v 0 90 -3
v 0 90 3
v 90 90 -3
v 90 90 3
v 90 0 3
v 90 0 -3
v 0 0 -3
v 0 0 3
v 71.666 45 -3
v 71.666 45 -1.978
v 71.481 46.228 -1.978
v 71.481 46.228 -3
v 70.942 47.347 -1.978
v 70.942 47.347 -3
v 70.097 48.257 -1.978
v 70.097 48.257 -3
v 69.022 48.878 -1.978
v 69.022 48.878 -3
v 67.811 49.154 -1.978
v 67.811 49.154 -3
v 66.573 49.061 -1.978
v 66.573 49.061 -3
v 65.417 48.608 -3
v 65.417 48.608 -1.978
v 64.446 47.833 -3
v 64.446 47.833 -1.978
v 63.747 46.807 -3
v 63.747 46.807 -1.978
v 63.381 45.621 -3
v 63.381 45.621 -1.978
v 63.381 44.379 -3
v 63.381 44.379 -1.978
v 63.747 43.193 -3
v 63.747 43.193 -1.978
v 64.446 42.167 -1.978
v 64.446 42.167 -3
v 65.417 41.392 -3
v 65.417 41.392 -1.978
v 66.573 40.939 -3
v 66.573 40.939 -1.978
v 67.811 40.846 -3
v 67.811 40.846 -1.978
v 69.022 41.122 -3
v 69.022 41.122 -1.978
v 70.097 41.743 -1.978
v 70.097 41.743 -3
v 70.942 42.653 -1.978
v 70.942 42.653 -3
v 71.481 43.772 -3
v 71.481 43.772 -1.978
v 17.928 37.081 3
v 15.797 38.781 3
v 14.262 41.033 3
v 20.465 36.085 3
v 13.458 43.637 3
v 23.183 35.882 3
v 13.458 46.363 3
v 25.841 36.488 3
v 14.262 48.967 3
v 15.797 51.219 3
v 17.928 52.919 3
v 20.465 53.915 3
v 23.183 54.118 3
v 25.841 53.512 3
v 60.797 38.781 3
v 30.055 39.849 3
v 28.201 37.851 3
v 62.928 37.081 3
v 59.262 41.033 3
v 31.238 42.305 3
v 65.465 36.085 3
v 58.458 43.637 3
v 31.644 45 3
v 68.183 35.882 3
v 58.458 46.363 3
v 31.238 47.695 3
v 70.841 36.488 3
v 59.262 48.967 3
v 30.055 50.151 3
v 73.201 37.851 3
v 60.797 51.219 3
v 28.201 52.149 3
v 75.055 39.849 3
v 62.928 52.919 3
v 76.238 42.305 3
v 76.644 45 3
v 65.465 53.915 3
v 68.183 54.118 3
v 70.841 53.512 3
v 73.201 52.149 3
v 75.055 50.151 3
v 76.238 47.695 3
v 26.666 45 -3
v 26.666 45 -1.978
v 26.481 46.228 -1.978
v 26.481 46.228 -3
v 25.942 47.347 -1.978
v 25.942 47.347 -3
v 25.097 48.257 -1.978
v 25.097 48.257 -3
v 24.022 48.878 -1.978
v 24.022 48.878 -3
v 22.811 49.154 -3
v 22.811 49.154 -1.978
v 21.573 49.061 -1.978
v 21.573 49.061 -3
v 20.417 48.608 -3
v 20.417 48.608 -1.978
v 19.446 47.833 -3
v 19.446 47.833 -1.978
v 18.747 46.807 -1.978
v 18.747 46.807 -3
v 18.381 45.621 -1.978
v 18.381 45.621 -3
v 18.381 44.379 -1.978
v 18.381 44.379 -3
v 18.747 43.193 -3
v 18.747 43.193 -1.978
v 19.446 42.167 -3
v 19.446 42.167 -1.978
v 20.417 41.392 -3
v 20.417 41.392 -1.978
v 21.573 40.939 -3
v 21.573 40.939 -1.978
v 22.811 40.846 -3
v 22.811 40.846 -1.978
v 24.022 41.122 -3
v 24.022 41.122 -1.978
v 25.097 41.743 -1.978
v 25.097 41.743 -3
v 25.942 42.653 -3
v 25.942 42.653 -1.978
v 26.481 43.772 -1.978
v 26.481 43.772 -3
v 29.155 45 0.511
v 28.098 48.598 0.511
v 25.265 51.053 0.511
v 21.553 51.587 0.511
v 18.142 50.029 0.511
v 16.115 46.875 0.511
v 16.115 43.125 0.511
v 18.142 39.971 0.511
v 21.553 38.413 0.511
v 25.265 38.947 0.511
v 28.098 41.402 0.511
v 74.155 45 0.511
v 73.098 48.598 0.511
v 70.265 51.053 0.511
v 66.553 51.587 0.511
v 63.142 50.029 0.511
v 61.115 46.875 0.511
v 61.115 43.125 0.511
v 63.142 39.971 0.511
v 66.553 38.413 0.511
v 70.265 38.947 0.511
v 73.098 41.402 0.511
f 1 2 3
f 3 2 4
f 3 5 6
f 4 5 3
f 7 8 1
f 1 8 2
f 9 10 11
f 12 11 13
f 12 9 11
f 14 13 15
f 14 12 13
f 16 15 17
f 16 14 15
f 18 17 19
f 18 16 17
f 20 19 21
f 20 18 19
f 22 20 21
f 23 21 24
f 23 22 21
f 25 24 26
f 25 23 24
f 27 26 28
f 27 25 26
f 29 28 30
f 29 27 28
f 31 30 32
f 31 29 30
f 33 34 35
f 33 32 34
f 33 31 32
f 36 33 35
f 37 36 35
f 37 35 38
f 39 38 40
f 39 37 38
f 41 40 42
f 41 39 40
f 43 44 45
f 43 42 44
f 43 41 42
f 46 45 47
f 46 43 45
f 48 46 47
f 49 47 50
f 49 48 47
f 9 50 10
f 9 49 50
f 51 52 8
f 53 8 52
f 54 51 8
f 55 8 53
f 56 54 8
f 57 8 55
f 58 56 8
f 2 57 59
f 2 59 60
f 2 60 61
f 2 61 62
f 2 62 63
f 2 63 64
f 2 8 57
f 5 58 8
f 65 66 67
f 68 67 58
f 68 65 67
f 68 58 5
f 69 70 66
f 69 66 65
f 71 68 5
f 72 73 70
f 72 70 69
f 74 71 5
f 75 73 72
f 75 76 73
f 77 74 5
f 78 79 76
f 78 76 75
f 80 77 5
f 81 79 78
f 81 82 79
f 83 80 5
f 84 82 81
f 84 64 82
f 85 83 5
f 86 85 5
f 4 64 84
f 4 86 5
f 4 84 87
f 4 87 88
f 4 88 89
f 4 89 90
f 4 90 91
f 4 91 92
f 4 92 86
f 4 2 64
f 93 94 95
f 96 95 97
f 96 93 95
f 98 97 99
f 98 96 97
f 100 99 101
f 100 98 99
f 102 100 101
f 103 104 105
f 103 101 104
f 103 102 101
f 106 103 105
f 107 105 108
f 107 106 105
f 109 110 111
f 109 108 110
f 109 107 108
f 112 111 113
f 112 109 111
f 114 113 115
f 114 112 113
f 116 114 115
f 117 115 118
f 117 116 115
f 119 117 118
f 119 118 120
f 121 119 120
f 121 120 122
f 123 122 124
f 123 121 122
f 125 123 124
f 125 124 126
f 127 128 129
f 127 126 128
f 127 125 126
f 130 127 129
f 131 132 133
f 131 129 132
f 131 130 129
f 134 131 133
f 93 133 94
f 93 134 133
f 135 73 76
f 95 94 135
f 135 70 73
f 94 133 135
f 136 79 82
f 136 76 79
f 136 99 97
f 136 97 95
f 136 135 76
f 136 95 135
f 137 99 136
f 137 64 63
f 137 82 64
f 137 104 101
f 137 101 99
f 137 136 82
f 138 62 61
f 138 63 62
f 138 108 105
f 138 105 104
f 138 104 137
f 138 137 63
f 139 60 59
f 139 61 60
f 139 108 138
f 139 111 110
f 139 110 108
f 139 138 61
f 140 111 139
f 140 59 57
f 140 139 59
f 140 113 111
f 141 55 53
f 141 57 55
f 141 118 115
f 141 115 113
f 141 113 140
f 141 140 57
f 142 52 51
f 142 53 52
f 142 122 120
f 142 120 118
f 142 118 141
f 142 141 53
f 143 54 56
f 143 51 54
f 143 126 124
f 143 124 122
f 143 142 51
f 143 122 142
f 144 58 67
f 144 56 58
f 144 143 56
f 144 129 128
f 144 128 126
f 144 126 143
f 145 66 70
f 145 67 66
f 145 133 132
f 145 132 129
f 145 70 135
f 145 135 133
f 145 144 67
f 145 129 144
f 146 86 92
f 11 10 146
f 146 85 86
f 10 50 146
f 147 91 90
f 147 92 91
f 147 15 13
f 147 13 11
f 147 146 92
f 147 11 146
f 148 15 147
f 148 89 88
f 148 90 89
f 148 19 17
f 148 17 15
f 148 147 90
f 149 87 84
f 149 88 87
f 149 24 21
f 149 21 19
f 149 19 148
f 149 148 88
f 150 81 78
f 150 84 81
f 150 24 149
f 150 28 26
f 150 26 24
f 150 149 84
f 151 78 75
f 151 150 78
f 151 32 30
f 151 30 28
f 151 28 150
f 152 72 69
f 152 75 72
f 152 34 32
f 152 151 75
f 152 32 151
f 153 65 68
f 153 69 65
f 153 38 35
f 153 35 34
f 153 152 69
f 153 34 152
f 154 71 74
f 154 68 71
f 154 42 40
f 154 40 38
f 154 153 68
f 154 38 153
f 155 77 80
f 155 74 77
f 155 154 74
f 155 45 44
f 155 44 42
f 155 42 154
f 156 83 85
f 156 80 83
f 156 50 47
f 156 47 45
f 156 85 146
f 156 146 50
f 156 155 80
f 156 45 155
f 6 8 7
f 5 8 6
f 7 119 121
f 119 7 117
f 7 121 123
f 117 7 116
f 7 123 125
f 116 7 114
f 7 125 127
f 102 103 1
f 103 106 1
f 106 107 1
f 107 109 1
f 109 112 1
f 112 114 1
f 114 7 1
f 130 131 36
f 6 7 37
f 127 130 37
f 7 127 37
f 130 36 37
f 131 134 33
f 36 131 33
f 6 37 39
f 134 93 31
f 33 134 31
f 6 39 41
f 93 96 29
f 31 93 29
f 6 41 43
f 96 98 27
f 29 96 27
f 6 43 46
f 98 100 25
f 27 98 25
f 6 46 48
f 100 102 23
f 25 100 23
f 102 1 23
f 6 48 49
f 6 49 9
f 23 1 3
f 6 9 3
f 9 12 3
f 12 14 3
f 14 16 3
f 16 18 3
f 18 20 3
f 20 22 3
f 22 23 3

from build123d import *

# Parameters (mm, degrees)
SKETCH1_W           = 90
SKETCH1_H           = 90
SKETCH1_R           = 4.1656
BOSS_EXTRUDE1_DEPTH = 3
SKETCH2_R           = 9.144
CUT_EXTRUDE1_DEPTH  = 7
CUT_EXTRUDE1_TAPER  = 45


with BuildPart() as part:
    # Sketch1 → Boss-Extrude1 (new body, symmetric)
    with BuildSketch(Plane.XY):
        with Locations((45, 45)):
            Rectangle(SKETCH1_W, SKETCH1_H)
        with Locations((22.5, 45)):
            Circle(SKETCH1_R, mode=Mode.SUBTRACT)
        with Locations((67.5, 45)):
            Circle(SKETCH1_R, mode=Mode.SUBTRACT)
    extrude(amount=BOSS_EXTRUDE1_DEPTH, both=True)

    # Sketch2 → Cut-Extrude1 (cut, through all)
    with BuildSketch(Plane.XY.offset(3)):
        with Locations((22.5, 45)):
            Circle(SKETCH2_R)
        with Locations((67.5, 45)):
            Circle(SKETCH2_R)
    extrude(amount=-CUT_EXTRUDE1_DEPTH, taper=CUT_EXTRUDE1_TAPER, mode=Mode.SUBTRACT)


solid = part.part
